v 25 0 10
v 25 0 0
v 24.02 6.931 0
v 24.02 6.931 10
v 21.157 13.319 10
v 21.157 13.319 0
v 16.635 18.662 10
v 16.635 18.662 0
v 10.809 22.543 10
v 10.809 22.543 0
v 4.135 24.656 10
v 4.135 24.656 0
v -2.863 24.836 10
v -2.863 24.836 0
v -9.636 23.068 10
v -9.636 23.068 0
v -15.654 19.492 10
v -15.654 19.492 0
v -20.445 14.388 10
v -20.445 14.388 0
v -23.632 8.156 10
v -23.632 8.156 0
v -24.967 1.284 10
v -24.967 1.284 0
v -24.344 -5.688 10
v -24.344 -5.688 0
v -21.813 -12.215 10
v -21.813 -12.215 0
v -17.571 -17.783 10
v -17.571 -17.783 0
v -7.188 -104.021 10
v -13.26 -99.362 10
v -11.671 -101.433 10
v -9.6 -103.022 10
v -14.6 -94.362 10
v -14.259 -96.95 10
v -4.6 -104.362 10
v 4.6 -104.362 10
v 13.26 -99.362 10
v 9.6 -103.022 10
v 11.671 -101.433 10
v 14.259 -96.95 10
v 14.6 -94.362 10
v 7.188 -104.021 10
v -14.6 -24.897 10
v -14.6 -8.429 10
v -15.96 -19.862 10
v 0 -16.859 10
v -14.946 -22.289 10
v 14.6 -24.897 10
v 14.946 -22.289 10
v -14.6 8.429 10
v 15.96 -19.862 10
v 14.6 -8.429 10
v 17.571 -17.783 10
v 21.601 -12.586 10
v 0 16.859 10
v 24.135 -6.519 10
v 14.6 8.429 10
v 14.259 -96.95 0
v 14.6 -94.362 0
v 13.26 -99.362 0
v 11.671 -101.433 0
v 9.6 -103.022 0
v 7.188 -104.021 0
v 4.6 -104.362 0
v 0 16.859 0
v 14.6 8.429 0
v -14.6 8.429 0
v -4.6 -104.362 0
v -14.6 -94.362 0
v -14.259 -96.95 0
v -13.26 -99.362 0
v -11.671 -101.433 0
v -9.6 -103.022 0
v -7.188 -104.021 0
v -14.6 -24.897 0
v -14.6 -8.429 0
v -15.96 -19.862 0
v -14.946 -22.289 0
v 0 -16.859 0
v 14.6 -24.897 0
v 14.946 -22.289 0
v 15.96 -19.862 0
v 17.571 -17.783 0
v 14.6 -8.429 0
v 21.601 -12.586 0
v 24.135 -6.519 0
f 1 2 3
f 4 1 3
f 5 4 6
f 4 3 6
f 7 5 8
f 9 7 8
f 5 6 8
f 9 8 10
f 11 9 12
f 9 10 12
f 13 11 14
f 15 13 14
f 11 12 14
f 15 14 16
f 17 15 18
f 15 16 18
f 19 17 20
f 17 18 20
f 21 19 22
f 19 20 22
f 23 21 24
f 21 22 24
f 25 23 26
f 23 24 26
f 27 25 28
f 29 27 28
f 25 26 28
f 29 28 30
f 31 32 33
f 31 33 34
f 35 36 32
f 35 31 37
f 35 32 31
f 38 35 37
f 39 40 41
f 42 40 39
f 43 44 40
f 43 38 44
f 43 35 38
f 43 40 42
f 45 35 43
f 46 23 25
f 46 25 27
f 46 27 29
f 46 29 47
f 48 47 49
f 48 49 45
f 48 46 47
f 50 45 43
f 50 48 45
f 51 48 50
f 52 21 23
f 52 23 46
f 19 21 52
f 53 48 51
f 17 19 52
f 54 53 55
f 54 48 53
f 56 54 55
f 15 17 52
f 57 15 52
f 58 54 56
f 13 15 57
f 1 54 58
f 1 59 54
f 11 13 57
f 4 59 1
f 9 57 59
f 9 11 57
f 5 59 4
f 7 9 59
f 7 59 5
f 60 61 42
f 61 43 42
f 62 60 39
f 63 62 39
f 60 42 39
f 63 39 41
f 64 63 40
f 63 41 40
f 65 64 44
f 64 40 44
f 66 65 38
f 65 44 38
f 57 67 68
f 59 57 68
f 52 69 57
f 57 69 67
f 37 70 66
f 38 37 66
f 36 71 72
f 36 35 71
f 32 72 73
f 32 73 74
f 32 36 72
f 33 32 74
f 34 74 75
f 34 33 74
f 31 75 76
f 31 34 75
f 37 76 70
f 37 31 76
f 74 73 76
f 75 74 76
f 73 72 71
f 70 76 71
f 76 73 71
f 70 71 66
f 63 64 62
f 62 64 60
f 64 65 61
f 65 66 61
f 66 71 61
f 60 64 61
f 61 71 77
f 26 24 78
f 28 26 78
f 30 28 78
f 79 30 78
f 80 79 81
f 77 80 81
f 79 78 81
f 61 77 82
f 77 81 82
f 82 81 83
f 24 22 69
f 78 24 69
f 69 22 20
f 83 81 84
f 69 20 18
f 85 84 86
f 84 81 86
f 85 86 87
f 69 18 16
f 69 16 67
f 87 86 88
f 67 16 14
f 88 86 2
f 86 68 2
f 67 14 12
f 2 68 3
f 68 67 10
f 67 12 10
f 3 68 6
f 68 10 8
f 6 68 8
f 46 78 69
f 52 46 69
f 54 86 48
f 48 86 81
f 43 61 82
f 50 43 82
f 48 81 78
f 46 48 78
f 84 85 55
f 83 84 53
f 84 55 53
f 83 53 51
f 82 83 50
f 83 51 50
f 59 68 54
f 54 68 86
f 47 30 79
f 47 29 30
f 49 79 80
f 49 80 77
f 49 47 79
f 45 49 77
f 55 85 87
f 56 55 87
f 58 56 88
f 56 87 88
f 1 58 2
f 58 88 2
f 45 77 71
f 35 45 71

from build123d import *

# Parameters (mm, degrees)
F1_DEPTH = 10
F2_R     = 10
F3_R     = 10


with BuildPart() as f1:
    # F0 (on Top) → F1 (new body)
    with BuildSketch(Plane.XY):
        with BuildLine():
            Line((-14.6, -8.429314), (-14.6, -20.293841))
            ThreePointArc((-14.6, -20.293841), (0, -25), (14.6, -20.293841))
            Line((14.6, -20.293841), (14.6, -8.429314))
            Line((14.6, -8.429314), (0, -16.858628))
            Line((0, -16.858628), (-14.6, -8.429314))
        make_face()
        with BuildLine():
            ThreePointArc((14.6, -20.293841), (22.248595, -11.401754), (25, 0))
            ThreePointArc((25, 0), (-11.401754, 22.248595), (-14.6, -20.293841))
            Line((-14.6, -20.293841), (-14.6, -8.429314))
            Line((-14.6, -8.429314), (-14.6, 8.429314))
            Line((-14.6, 8.429314), (0, 16.858628))
            Line((0, 16.858628), (14.6, 8.429314))
            Line((14.6, 8.429314), (14.6, -8.429314))
            Line((14.6, -8.429314), (14.6, -20.293841))
        make_face()
        with BuildLine():
            ThreePointArc((14.6, -20.293841), (0, -25), (-14.6, -20.293841))
            Line((-14.6, -20.293841), (-14.6, -104.361953))
            Line((-14.6, -104.361953), (14.6, -104.361953))
            Line((14.6, -104.361953), (14.6, -20.293841))
        make_face()
    extrude(amount=F1_DEPTH)

    # F2
    f2_edges = [f1.edges().sort_by_distance(p)[0] for p in [
        (14.6, -20.293841, 5),
    ]]
    fillet(f2_edges, radius=F2_R)

    # F3
    f3_edges = [f1.edges().sort_by_distance(p)[0] for p in [
        (-14.6, -20.293841, 5),
        (-14.6, -104.361953, 5),
        (14.6, -104.361953, 5),
    ]]
    fillet(f3_edges, radius=F3_R)


solid = f1.part
